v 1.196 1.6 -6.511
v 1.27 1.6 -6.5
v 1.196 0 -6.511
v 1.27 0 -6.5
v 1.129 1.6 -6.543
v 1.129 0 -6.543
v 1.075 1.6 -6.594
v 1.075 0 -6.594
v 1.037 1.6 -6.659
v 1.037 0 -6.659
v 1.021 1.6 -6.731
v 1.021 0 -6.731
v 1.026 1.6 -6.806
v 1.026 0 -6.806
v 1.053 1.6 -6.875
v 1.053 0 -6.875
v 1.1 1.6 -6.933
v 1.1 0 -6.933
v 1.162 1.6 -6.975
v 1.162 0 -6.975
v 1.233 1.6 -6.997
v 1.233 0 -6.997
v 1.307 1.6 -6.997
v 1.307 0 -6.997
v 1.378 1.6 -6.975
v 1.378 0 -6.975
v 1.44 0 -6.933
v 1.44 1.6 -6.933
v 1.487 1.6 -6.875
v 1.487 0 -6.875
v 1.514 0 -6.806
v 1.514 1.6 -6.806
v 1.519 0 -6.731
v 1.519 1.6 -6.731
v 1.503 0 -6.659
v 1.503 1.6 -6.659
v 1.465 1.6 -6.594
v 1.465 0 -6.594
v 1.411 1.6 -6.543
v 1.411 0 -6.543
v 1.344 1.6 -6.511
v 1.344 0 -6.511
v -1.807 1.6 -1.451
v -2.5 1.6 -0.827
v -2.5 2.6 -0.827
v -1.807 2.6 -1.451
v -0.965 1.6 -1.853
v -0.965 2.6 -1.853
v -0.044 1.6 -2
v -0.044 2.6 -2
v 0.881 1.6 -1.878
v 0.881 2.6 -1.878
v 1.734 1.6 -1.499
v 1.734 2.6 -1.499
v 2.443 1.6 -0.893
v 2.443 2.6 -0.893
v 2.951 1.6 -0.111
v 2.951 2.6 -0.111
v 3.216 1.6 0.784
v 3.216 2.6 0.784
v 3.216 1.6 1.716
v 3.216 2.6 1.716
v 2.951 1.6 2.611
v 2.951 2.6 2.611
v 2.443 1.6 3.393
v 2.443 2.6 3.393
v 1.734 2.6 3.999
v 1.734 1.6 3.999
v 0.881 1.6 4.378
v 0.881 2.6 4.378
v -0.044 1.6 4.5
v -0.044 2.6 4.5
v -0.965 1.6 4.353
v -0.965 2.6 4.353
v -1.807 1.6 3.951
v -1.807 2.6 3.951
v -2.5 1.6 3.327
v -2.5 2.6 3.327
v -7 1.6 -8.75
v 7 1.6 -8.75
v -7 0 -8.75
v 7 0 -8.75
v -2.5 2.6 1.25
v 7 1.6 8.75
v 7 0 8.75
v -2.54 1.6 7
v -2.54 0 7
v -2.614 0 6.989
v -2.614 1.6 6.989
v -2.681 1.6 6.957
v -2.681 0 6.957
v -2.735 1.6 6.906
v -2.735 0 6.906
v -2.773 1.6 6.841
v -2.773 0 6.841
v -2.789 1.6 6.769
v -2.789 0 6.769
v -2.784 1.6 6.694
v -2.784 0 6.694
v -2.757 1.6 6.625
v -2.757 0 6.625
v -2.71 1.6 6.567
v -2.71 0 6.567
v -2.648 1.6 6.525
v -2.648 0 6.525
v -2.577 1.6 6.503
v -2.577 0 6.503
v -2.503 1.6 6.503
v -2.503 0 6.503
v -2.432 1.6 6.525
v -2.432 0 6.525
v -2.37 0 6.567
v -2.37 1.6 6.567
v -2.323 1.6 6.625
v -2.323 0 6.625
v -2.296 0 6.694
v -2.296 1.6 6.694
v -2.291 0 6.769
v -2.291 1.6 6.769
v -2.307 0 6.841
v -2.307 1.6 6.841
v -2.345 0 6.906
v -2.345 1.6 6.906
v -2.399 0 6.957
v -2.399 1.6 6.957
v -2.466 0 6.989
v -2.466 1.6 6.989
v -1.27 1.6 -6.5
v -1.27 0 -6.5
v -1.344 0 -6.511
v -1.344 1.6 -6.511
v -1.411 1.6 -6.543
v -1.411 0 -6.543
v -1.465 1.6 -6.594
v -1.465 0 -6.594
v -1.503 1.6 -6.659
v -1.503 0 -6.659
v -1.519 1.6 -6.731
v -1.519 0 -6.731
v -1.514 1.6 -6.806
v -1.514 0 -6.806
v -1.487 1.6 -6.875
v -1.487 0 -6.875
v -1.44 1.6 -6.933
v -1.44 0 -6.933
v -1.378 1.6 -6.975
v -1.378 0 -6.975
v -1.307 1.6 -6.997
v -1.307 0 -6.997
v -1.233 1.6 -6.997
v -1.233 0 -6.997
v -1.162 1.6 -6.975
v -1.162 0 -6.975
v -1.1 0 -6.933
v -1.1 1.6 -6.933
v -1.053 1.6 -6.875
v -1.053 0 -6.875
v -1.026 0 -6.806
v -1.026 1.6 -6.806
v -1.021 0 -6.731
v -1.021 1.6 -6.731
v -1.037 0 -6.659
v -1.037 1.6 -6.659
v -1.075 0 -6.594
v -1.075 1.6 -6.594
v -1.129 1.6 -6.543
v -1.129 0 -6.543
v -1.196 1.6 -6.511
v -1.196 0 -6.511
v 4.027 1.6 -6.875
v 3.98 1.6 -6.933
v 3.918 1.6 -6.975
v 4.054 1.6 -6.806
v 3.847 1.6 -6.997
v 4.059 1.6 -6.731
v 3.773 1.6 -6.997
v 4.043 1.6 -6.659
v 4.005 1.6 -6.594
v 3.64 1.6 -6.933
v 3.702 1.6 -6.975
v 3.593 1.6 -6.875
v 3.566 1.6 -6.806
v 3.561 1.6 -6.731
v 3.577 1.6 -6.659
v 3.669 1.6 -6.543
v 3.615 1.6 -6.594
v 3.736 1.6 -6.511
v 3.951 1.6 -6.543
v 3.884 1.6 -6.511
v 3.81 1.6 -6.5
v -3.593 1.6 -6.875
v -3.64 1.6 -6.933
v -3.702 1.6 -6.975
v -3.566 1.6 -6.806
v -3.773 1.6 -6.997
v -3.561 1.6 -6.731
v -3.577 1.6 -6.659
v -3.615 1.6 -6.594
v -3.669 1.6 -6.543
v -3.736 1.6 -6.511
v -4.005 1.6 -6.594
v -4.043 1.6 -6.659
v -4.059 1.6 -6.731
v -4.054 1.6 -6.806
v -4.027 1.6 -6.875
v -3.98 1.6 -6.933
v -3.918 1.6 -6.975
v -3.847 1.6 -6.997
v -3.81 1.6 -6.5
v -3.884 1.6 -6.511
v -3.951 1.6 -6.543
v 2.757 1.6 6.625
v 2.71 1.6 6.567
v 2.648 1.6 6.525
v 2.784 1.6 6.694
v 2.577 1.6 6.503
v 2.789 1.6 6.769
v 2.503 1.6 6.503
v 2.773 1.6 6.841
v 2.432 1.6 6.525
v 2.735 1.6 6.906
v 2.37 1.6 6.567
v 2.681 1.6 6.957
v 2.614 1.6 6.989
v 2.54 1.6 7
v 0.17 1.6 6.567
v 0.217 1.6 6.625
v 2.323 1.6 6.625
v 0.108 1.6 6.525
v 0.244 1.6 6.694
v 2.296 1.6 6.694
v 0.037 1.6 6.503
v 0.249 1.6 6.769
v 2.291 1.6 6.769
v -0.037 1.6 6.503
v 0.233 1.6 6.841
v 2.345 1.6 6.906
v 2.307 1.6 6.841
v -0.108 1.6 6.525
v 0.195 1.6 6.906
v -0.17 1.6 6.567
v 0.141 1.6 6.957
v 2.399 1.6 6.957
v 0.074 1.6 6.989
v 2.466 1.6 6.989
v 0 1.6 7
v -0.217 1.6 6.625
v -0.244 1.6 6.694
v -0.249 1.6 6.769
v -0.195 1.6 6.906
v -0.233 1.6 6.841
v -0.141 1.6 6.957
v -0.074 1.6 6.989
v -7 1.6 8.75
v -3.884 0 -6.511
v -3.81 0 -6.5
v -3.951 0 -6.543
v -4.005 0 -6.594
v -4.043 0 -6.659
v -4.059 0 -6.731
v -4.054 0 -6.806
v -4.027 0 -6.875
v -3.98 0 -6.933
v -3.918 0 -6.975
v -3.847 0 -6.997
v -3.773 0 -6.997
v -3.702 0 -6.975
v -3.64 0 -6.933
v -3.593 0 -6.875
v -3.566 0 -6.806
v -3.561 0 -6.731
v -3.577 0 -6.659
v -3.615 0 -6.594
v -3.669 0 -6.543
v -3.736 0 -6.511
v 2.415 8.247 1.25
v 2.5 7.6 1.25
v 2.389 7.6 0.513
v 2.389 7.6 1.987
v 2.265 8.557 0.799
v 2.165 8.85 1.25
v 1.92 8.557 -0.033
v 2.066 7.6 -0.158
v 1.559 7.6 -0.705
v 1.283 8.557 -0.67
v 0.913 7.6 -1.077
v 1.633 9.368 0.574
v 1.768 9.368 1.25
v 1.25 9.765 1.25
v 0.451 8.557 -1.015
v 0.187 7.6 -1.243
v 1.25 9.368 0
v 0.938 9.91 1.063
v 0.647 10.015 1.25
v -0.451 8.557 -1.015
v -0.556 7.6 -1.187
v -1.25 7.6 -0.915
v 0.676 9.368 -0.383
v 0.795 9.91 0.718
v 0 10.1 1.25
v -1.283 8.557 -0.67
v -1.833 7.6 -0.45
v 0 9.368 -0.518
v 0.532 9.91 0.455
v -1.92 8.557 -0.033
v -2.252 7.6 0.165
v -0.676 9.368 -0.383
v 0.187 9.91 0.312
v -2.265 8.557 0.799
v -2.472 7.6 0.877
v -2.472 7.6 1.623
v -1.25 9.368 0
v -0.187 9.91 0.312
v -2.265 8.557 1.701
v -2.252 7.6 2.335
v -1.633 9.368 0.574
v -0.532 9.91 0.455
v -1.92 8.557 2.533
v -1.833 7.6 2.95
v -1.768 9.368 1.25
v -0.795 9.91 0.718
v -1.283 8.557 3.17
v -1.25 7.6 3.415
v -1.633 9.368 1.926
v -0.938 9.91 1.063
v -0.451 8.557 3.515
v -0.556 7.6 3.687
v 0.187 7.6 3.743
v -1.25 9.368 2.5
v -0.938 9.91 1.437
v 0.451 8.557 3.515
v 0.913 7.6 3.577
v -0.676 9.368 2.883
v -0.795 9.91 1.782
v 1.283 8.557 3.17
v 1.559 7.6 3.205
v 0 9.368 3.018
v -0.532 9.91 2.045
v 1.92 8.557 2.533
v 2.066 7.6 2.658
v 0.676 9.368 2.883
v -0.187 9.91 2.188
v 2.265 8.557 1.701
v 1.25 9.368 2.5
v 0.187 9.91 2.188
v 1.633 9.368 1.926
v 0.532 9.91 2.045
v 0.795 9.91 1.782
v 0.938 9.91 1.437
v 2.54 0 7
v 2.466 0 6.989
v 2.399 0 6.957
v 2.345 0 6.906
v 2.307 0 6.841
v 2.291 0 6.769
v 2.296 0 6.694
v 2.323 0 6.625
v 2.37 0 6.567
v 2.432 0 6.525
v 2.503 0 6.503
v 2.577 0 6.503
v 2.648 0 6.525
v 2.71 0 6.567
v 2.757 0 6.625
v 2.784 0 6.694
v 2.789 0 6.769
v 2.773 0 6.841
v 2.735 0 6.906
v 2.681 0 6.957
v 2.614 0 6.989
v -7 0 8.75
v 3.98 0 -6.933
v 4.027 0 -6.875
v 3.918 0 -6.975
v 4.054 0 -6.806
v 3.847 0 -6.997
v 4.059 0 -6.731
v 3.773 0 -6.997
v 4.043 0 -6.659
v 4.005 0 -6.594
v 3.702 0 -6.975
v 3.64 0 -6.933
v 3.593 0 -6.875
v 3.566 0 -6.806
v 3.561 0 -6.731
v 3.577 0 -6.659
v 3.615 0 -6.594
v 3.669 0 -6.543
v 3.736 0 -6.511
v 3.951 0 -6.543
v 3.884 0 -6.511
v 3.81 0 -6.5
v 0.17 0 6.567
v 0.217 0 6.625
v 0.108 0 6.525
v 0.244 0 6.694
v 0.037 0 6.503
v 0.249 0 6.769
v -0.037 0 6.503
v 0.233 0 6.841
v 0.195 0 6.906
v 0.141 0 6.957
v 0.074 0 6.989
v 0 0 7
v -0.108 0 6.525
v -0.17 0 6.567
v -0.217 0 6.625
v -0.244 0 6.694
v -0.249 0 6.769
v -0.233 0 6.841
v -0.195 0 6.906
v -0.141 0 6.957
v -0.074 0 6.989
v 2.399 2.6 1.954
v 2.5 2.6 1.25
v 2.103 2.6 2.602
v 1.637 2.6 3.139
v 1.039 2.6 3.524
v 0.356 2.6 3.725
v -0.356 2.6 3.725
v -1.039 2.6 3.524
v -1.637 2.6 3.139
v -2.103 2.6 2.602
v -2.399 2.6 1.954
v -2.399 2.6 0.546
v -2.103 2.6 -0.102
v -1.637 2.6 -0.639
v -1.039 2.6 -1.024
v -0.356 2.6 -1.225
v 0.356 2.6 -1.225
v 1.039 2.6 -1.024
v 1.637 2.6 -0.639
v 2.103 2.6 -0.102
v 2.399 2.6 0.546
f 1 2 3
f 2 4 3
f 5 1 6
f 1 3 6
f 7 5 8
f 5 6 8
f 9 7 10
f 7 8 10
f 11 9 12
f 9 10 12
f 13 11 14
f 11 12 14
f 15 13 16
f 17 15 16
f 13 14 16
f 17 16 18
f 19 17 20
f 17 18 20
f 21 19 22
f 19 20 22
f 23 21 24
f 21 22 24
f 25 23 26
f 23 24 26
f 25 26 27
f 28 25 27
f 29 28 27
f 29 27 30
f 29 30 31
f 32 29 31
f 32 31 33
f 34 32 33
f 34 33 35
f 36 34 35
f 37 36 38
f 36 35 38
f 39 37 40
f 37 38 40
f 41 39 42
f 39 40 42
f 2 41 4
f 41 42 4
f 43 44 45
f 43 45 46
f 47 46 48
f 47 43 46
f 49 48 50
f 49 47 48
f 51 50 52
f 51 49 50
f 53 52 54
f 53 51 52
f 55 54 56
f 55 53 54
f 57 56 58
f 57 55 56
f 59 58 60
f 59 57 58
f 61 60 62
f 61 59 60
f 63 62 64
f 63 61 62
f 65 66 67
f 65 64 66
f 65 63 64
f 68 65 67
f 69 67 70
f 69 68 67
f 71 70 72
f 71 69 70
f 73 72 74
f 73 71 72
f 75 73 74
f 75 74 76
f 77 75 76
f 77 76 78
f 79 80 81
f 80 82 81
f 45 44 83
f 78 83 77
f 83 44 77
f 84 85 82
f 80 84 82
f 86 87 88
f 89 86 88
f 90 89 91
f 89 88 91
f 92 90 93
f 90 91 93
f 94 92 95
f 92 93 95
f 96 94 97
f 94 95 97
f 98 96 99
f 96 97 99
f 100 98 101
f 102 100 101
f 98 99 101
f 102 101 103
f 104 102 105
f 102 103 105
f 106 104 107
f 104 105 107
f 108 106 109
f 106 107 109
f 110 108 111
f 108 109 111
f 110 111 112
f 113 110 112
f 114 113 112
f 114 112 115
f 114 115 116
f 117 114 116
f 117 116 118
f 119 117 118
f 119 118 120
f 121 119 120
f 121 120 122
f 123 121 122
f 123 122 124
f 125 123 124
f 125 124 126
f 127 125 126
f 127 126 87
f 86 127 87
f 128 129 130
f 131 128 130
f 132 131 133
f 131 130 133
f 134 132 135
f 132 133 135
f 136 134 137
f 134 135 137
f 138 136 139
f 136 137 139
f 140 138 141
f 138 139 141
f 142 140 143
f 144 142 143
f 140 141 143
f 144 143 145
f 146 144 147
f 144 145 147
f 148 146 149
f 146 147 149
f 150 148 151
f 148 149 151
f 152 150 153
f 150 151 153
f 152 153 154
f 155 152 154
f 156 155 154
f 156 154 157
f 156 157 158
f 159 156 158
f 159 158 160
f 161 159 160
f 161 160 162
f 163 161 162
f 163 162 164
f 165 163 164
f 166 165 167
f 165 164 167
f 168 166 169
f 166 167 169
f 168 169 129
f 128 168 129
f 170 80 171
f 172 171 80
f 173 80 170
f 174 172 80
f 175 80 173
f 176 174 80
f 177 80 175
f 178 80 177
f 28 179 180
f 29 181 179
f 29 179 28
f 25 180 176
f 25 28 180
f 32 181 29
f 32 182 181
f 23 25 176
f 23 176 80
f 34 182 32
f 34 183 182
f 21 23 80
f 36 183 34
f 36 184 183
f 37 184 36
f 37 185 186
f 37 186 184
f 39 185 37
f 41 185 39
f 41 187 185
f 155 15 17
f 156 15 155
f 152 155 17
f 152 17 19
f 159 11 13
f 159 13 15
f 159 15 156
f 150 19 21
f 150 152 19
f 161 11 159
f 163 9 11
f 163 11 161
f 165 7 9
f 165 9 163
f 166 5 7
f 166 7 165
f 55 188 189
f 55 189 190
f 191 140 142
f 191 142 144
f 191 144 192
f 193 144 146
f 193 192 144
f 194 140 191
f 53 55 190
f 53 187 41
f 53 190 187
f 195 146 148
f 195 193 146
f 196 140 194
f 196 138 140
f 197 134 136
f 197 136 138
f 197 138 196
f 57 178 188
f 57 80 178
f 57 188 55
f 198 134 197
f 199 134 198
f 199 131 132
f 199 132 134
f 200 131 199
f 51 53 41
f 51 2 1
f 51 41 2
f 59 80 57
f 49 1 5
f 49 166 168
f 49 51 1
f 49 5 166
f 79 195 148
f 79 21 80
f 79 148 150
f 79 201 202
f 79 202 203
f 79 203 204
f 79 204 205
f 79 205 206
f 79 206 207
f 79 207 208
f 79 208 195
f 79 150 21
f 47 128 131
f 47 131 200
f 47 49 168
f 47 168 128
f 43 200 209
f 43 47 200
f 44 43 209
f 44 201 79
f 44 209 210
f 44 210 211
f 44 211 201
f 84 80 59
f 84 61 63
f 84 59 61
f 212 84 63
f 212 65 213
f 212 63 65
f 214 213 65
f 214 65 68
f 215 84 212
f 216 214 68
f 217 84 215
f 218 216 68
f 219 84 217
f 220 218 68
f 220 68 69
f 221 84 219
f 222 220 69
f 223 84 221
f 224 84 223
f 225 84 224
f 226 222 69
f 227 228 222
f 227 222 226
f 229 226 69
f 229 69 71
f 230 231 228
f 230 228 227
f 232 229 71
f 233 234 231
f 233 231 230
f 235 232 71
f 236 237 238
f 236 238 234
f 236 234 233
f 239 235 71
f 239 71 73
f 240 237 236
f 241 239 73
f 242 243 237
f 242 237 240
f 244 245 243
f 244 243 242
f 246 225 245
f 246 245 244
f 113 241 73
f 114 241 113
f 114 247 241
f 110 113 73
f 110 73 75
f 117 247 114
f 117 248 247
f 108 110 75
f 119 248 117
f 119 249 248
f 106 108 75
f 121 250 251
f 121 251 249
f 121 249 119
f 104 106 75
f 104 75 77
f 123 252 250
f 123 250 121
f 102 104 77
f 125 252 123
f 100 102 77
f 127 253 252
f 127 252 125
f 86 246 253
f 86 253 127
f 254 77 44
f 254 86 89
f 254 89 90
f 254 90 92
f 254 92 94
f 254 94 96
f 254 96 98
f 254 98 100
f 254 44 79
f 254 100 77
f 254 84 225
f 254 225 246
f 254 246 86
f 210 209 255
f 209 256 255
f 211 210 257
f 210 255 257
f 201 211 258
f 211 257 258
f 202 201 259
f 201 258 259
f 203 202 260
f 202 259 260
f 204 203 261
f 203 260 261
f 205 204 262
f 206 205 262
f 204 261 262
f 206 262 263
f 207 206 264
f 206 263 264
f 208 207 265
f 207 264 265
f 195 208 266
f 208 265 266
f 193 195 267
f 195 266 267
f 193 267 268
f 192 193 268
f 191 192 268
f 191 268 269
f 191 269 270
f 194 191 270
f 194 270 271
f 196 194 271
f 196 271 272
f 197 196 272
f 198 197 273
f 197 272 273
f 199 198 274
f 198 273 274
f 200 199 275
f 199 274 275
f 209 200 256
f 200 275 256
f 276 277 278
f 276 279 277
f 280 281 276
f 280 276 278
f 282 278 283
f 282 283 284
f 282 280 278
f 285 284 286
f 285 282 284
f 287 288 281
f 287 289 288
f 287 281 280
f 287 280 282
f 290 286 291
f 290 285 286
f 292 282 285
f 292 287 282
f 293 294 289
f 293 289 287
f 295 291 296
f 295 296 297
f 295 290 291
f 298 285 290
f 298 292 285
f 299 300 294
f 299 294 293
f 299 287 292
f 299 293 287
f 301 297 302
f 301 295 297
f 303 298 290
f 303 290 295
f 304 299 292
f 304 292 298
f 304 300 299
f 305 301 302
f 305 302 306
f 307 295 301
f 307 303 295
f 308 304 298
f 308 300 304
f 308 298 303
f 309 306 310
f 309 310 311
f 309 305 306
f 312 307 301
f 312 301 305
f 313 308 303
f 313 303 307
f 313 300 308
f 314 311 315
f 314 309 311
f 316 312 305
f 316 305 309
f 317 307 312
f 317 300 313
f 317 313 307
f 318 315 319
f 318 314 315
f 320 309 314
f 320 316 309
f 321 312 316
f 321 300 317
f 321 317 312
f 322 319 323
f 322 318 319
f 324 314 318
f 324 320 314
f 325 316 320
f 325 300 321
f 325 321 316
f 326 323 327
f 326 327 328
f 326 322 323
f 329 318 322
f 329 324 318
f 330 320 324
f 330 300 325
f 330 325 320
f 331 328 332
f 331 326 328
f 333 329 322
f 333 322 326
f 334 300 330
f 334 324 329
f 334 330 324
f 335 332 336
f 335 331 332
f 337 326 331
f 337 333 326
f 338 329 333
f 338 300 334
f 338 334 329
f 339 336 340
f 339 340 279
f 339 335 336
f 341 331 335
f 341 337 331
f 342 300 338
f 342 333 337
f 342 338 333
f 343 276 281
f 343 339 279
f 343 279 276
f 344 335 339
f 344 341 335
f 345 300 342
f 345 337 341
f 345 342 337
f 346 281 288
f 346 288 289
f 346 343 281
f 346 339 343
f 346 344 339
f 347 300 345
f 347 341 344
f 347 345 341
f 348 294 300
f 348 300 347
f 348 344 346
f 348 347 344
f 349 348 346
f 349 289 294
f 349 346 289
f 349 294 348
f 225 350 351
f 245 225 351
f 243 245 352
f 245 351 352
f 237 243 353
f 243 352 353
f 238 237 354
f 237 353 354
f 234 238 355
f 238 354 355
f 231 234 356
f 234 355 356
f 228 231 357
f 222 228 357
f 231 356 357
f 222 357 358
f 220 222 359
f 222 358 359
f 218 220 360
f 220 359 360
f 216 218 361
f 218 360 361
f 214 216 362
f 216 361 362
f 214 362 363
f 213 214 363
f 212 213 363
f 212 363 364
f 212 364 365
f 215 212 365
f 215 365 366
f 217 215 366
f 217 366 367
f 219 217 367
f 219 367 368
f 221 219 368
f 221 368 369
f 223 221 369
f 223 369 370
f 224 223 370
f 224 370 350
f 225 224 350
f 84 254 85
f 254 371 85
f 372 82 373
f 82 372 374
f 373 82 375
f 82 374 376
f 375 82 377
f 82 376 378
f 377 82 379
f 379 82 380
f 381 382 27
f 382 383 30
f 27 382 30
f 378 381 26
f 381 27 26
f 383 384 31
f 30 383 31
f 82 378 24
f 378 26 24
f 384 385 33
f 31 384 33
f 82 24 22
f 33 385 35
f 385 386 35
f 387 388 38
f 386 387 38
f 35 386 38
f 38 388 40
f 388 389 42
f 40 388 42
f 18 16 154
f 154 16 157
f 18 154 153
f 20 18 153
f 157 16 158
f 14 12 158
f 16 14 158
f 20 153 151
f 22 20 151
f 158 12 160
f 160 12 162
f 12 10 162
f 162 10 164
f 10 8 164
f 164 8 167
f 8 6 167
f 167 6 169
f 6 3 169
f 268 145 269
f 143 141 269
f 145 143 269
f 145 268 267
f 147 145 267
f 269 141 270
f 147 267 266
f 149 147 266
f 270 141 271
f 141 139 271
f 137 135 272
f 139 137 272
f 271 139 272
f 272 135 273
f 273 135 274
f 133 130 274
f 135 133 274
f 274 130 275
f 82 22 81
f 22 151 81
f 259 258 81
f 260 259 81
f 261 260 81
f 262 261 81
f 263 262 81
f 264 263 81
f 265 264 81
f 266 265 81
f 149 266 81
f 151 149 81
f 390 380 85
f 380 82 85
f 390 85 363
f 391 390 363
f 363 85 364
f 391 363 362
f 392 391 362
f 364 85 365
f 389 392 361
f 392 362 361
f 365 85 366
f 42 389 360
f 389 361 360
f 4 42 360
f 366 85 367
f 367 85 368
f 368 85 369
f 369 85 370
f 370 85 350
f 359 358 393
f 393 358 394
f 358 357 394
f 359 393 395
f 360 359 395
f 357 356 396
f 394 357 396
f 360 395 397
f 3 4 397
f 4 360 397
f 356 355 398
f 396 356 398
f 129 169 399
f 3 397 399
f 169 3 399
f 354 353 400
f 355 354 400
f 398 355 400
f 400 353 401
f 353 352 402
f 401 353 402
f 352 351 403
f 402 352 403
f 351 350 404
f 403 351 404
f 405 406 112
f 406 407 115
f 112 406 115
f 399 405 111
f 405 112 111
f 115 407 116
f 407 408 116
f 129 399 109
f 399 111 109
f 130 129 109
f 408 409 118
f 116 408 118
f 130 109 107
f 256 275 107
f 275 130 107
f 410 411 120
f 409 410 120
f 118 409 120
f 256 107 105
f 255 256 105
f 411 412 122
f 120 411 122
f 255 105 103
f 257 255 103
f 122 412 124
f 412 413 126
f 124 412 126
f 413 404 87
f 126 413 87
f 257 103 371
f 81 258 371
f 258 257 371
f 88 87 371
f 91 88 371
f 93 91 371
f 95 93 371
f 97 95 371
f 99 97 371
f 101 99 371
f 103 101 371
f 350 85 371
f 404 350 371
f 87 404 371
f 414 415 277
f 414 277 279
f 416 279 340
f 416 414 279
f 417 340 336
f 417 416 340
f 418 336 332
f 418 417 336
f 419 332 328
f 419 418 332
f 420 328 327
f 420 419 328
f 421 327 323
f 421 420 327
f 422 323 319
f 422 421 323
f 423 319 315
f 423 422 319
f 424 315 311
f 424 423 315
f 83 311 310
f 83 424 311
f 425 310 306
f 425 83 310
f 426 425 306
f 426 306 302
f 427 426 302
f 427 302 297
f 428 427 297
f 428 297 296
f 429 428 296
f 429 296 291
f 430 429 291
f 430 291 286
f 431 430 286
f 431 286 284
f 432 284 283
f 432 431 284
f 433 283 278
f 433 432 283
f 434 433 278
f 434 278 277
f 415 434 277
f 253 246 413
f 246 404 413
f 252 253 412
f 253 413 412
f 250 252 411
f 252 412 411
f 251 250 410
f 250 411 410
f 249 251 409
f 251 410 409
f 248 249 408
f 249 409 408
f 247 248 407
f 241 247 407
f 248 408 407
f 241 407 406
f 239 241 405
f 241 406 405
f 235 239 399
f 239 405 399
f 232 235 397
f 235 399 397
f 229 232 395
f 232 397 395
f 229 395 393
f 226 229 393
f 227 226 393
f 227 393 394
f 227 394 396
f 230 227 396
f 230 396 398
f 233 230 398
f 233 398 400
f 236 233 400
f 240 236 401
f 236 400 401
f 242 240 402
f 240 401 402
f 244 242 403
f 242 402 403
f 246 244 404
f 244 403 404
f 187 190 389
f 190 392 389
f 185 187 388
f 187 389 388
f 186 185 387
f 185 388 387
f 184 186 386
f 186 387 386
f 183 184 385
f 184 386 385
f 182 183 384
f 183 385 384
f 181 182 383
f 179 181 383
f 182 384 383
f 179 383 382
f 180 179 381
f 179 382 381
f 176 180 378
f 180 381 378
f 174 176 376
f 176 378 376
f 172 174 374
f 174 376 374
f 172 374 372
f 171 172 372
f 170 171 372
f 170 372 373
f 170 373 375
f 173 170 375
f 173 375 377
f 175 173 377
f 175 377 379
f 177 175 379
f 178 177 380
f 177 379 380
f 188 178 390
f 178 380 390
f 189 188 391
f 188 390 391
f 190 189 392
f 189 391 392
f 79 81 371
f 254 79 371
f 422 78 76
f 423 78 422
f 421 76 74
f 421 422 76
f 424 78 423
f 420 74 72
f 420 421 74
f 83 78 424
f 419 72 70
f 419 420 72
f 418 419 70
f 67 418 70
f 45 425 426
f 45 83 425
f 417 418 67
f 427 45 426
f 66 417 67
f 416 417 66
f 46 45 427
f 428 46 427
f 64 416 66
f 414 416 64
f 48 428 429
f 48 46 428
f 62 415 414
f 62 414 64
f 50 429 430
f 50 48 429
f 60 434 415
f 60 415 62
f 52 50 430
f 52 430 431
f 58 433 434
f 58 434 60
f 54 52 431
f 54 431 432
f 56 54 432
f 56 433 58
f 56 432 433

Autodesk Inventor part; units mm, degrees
ref_plane "YZ Plane" through (0, 0, 0) normal (1, 0, 0) x (0, 1, 0)
ref_plane "XZ Plane" through (0, 0, 0) normal (0, 1, 0) x (-1, 0, 0)
ref_plane "XY Plane" through (0, 0, 0) normal (0, 0, 1) x (1, 0, 0)
sketch "Sketch1" plane through (0, 0, 0) normal (0, 1, 0) x (-1, 0, 0)
  line L0 (7, 8.75) -> (-7, 8.75)
  line L1 (-7, 8.75) -> (-7, -8.75)
  line L2 (-7, -8.75) -> (7, -8.75)
  line L3 (7, -8.75) -> (7, 8.75)
  point P0 (0, 0)
  point P1 (0, -8.75)
  point P2 (-7, 0)
  dimension "d0" = 17.5
  dimension "d1" = 14
extrude "Extrusion1" add sketch "Sketch1" along normal blind 1.6
sketch "Sketch2" plane through (0, 1.6, 0) normal (0, 1, 0) x (1, 0, 0)
  line L0 (0, 3.5818) -> (0, 1.7058) construction
  line L1 (-7, -8.75) -> (7, -8.75) construction
  point P0 (0, 0)
  point P1 (0, -1.25)
  point P2 (-3.81, 6.75)
  point P3 (-1.27, 6.75)
  point P4 (1.27, 6.75)
  point P5 (3.81, 6.75)
  point P6 (-2.54, -6.75)
  point P7 (0, -6.75)
  point P8 (2.54, -6.75)
  dimension "d4" = 2.54
  dimension "d5" = 2.54
  dimension "d7" = 2.54
  dimension "d8" = 5.5
  dimension "d9" = 8
  dimension "d10" = 2
hole "Hole1" at (-3.81, 1.6, -6.75) at (-1.27, 1.6, -6.75) at (1.27, 1.6, -6.75) at (3.81, 1.6, -6.75) at (-2.54, 1.6, 6.75) at (0, 1.6, 6.75) at (2.54, 1.6, 6.75) direction (0, -1, 0) diameter 0.5 end through all
sketch "Sketch3" plane through (0, 1.6, 0) normal (0, 1, 0) x (1, 0, 0)
  circle A0 centre (0, -1.25) radius 2.5
  circle A1 centre (0, -6.75) radius 0.25 projected
  point P0 (0, 0)
  dimension "d20" = 5.5
  dimension "d21" = 5
sketch "Sketch4" plane through (0, 1.6, 0) normal (0, 1, 0) x (1, 0, 0)
  point P0 (0, 0)
extrude "Extrusion2" add sketch "Sketch3" along normal blind 8.5 contours A0
fillet "Fillet1" radius 2.5 1 edges at (-2.5, 10.1, 1.25)
sketch "Sketch5" plane through (0, 1.6, 0) normal (0, 1, 0) x (1, 0, 0)
  circle A0 centre (0, -1.25) radius 2.5 projected
  arc A1 (-2.5, -3.3267) -> (-2.5, 0.8267) centre (0, -1.25) ccw
  line L0 (-2.5, 0.8267) -> (-2.5, -3.3267)
  point P0 (0, 0)
  point P1 (-2.5, -1.25)
  dimension "d23" = 6.5
extrude "Extrusion3" add sketch "Sketch5" along normal blind 1
equation "\"d5\" = d4"
equation "\"d7\" = d4"
properties part number "LED_module"
